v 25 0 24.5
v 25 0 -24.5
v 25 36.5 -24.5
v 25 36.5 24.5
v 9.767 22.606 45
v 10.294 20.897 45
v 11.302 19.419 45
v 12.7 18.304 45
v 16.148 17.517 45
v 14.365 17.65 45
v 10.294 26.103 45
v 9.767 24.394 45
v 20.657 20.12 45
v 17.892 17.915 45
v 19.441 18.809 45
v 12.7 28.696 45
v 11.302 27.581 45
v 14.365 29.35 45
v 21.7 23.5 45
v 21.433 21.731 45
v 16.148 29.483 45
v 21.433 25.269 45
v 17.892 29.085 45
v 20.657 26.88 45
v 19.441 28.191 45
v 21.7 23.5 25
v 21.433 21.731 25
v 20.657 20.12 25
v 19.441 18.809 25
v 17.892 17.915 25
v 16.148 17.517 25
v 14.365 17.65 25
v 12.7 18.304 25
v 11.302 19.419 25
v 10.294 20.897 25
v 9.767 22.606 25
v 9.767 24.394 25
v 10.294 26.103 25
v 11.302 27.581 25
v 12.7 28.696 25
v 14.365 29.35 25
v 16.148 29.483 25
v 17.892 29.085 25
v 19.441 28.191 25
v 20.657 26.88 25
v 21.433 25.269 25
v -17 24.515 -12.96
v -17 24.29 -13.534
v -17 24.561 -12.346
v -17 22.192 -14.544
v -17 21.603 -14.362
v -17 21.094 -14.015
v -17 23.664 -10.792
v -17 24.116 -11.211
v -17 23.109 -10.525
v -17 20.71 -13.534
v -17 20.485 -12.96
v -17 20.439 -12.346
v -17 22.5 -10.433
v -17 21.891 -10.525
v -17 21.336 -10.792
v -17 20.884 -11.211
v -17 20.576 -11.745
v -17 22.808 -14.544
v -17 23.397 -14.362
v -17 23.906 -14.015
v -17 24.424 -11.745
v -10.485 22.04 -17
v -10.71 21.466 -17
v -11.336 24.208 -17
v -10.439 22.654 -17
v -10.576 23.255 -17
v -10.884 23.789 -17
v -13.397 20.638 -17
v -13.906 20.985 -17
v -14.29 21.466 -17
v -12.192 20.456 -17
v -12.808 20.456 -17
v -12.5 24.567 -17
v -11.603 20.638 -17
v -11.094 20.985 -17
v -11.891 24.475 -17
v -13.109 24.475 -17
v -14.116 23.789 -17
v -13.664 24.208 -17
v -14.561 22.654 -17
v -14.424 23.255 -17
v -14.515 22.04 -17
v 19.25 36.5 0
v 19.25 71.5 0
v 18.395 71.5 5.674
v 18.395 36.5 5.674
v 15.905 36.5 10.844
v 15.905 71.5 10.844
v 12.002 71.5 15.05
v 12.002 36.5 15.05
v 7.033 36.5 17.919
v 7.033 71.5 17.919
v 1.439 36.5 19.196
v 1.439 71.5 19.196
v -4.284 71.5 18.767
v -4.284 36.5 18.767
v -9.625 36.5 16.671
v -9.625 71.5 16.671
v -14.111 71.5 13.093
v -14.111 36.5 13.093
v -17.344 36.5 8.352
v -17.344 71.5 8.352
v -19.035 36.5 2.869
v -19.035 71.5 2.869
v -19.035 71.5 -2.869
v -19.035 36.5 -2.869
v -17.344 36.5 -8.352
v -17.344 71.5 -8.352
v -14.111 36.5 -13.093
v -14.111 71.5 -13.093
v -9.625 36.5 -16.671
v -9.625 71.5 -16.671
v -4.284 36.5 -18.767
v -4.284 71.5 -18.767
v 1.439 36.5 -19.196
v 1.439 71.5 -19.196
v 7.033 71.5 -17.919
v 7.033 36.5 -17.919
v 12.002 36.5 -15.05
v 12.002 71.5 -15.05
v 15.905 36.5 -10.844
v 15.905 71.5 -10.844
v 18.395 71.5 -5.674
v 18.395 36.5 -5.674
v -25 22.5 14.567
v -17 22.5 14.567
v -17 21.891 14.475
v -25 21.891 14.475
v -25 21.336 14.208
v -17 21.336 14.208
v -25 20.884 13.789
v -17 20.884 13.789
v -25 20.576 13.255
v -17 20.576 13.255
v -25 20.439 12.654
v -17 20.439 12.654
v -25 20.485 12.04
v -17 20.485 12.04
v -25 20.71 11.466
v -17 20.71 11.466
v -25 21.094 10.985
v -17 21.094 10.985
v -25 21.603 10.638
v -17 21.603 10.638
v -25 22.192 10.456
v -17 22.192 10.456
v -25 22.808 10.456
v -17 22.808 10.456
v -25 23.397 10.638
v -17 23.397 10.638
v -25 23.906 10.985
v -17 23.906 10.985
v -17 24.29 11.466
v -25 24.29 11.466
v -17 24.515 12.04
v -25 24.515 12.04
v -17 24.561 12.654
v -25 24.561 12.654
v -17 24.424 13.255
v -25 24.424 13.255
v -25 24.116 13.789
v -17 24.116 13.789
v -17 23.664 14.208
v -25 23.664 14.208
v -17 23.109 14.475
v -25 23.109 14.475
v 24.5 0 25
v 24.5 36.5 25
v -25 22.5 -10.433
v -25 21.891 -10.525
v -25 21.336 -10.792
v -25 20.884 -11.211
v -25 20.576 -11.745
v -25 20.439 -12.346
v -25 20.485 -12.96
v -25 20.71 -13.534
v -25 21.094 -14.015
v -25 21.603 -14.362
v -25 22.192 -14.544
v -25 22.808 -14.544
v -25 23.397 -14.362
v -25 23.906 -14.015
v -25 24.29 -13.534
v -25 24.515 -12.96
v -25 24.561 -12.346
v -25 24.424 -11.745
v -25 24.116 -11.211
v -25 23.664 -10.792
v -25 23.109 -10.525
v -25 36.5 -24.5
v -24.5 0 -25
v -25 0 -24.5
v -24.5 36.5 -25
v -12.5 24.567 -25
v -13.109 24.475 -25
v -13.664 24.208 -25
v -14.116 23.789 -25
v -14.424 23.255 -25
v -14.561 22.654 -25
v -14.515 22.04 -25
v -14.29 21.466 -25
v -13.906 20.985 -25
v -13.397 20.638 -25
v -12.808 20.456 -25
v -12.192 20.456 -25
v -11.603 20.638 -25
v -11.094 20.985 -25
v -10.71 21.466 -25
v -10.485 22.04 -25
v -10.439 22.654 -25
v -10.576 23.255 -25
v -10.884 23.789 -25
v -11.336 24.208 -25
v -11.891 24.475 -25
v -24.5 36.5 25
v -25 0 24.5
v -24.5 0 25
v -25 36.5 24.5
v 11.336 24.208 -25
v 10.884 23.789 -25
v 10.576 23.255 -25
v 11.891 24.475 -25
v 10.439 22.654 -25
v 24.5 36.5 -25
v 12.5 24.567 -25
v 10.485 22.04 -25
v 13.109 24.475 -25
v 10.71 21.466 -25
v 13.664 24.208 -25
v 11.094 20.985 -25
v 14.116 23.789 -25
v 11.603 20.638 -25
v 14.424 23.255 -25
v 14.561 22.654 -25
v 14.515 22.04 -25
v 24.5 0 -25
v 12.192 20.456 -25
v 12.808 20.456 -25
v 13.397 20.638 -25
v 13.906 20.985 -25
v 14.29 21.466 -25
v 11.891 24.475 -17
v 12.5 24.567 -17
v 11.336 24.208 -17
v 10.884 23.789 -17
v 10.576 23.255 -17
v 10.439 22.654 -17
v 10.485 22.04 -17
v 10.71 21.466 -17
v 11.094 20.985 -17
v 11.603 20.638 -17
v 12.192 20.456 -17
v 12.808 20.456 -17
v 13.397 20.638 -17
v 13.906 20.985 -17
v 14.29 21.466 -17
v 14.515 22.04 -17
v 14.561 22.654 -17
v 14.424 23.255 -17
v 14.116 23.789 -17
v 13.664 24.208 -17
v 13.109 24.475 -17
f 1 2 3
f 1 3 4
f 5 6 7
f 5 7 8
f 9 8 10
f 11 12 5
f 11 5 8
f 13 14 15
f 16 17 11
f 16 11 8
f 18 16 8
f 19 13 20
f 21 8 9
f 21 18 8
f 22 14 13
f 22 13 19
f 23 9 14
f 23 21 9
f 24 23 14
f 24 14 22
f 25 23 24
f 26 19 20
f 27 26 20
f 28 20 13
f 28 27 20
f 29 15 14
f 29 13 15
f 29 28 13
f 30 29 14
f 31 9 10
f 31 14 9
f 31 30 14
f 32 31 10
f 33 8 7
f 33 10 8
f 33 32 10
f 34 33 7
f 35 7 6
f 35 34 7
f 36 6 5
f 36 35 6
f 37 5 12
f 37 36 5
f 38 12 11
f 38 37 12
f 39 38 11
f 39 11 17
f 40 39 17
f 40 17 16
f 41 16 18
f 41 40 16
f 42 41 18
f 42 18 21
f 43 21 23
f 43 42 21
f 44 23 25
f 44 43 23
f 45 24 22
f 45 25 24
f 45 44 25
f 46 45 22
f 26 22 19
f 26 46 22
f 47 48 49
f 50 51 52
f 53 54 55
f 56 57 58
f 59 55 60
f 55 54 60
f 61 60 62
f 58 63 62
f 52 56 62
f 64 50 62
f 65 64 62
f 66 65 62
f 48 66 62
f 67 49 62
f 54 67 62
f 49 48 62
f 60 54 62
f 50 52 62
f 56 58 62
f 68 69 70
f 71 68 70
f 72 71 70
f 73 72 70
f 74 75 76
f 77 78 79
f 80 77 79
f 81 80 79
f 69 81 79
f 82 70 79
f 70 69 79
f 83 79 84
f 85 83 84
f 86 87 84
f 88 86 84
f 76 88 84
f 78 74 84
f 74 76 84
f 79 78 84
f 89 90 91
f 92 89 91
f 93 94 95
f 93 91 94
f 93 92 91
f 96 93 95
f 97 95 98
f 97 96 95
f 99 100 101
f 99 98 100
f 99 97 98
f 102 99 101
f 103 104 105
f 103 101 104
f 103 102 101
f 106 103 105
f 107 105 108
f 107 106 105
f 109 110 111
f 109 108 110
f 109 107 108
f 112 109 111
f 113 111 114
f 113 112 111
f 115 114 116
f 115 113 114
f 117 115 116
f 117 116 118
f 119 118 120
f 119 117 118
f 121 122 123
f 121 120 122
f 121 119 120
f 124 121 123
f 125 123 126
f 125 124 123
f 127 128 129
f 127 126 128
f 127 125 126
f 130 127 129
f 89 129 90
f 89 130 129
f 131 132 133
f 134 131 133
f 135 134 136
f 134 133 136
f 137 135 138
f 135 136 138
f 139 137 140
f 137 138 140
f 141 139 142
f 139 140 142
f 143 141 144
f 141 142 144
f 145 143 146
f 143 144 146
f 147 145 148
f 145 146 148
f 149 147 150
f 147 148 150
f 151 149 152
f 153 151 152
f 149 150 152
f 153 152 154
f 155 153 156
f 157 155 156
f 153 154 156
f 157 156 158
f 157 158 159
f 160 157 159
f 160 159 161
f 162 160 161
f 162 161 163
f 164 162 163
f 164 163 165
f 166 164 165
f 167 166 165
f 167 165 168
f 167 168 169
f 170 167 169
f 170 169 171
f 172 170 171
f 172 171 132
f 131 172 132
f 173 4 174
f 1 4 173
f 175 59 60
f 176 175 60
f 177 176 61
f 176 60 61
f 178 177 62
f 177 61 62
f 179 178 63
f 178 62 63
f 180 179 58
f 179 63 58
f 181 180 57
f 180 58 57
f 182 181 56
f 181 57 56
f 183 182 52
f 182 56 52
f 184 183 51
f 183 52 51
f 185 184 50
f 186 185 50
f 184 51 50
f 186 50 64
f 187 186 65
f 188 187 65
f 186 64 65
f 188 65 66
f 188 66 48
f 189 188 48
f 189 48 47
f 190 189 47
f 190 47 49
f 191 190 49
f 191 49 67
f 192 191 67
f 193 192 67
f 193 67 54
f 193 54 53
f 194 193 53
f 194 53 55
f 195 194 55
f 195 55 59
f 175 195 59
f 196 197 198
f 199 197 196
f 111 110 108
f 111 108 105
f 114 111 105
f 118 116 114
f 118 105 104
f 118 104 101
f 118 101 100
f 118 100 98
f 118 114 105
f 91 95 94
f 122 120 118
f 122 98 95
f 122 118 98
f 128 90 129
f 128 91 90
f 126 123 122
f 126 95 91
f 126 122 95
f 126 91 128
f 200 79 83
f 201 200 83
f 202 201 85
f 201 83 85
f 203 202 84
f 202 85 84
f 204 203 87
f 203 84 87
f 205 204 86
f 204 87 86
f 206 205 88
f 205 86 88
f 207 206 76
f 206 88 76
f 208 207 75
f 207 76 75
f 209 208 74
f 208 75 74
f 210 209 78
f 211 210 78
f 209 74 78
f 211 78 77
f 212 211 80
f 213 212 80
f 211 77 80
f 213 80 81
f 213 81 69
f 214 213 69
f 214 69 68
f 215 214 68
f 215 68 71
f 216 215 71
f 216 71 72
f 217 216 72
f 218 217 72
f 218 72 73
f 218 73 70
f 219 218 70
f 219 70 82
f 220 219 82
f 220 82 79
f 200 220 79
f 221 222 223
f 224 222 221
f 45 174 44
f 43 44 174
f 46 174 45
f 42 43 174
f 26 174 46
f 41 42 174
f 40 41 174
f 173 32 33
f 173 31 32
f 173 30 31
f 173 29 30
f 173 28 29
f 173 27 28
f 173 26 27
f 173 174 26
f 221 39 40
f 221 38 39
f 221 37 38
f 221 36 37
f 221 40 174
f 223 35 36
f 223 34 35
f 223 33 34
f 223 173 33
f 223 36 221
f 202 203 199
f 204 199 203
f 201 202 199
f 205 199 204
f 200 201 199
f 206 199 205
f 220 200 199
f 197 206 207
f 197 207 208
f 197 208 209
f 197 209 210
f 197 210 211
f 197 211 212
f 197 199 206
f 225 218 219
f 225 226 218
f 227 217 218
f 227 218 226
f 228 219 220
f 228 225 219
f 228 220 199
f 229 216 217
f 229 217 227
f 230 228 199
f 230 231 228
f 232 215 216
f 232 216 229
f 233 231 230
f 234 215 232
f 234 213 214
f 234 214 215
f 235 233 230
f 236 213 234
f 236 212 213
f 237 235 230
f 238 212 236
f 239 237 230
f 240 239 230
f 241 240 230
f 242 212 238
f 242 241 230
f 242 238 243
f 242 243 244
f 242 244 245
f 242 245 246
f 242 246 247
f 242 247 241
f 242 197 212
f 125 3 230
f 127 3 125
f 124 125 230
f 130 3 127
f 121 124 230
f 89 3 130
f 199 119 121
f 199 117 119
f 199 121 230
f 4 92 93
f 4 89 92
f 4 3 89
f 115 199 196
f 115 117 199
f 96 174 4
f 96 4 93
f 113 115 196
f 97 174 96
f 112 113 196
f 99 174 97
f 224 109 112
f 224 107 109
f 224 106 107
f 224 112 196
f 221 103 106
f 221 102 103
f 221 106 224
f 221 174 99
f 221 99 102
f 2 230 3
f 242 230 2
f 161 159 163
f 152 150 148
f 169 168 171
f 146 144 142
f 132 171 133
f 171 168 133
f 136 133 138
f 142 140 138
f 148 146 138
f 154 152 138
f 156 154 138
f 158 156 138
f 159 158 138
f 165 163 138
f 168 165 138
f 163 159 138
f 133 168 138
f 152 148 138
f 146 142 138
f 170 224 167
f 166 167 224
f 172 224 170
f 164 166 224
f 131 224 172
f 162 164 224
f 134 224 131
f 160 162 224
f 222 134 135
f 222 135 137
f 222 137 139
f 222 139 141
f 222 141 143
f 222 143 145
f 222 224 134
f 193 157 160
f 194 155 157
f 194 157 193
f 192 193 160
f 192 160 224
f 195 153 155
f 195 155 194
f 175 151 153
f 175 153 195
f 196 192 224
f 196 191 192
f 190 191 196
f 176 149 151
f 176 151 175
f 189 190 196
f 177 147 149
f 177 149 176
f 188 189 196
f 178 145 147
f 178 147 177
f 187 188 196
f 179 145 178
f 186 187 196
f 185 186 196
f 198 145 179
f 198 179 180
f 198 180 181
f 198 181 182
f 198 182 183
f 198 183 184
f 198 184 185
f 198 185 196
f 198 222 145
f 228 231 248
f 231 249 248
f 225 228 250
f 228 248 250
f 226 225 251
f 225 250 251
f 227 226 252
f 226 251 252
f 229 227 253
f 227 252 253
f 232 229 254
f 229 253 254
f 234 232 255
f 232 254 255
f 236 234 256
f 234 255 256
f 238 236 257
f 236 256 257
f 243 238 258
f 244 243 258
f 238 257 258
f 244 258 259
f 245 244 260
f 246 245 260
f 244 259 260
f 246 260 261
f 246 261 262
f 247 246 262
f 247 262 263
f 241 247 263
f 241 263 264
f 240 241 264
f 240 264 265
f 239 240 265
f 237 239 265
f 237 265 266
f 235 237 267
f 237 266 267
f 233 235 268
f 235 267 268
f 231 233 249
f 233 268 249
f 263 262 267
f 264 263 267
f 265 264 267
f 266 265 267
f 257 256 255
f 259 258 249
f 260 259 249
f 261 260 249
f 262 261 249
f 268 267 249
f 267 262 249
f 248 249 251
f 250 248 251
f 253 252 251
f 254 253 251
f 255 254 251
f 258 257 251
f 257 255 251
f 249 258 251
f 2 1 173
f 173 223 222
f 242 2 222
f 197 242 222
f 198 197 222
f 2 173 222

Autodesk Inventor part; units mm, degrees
ref_plane "YZ Plane" through (0, 0, 0) normal (1, 0, 0) x (0, 1, 0)
ref_plane "XZ Plane" through (0, 0, 0) normal (0, 1, 0) x (-1, 0, 0)
sketch "Sketch1" plane through (0, 0, 0) normal (0, 1, 0) x (-1, 0, 0)
  line L0 (-25, 25) -> (25, 25)
  line L1 (25, 25) -> (25, -25)
  line L2 (25, -25) -> (-25, -25)
  line L3 (-25, -25) -> (-25, 25)
  line L4 (-25, 25) -> (25, -25) construction
  line L5 (25, 25) -> (-25, -25) construction
  point P0 (0, 0)
  dimension "d0" = 50
  dimension "d1" = 50
extrude "Extrusion1" add sketch "Sketch1" along normal blind 36.5
sketch "Sketch2" plane through (-25, 0, 25) normal (0, 0, 1) x (1, 0, 0)
  line L0 (0, 0) -> (50, 0) projected
  line L1 (50, 0) -> (50, 36.5) projected
  line L2 (0, 36.5) -> (50, 36.5) projected
  line L3 (0, 0) -> (0, 36.5) projected
  circle A0 centre (40.7, 23.5) radius 6
  line L4 (25, 0) -> (25, 36.5) construction
  dimension "d4" = 15.7
  dimension "d5" = 13
  dimension "d6" = 12
extrude "Extrusion2" add sketch "Sketch2" along normal blind 20 contours A0
sketch "Sketch4" plane through (0, 36.5, 0) normal (0, 1, 0) x (1, 0, 0)
  circle A0 centre (0, 0) radius 19.25
  dimension "d12" = 38.5
extrude "Extrusion4" add sketch "Sketch4" along normal blind 35
sketch "Sketch7" plane through (25, 0, -25) normal (0, 0, -1) x (-1, 0, 0)
  line L0 (0, 0) -> (50, 0) projected
  line L1 (50, 0) -> (50, 36.5) projected
  line L2 (0, 36.5) -> (50, 36.5) projected
  line L3 (0, 0) -> (0, 36.5) projected
  line L4 (12.5, 22.5) -> (37.5, 22.5) construction
  point P0 (25, 0)
  point P1 (25, 22.5)
  point P2 (25, 0)
  dimension "d22" = 25
  dimension "d23" = 22.5
hole "Hole2" at (12.5, 22.5, -25) at (-12.5, 22.5, -25) direction (0, 0, 1) diameter 4.134 depth 8 thread size "M5x0.8" class "6H" standard "ISO Metric profile"
sketch "Sketch9" plane through (-25, 0, -25) normal (-1, 0, 0) x (0, 0, 1)
  line L0 (0, 0) -> (50, 0) projected
  line L1 (50, 0) -> (50, 36.5) projected
  line L2 (0, 36.5) -> (50, 36.5) projected
  line L3 (0, 0) -> (0, 36.5) projected
  line L4 (12.5, 22.5) -> (37.5, 22.5) construction
  point P0 (25, 0)
  point P1 (25, 22.5)
  point P2 (25, 0)
  dimension "d38" = 25
  dimension "d39" = 22.5
hole "Hole3" at (-25, 22.5, -12.5) at (-25, 22.5, 12.5) direction (1, 0, 0) diameter 4.134 depth 8 thread size "M5x0.8" class "6H" standard "ISO Metric profile"
chamfer "Chamfer1" distance 0.5 angle 45 4 edges at (25, 18.25, 25) (-25, 18.25, 25) (25, 18.25, -25) (-25, 18.25, -25)
sketch "Sketch10" plane through (15.7, 23.5, 45) normal (0, 0, 1) x (1, 0, 0)
  circle A0 centre (0, 0) radius 6 projected
  point P0 (-15.7, -23.5)
ref_plane "Work Plane4" through (15.7, 23.5, 45) normal (0, -1, 0) x (1, 0, 0)
properties part number "RE38S-600Z-1M-no-end" material "ABS Plastic"
